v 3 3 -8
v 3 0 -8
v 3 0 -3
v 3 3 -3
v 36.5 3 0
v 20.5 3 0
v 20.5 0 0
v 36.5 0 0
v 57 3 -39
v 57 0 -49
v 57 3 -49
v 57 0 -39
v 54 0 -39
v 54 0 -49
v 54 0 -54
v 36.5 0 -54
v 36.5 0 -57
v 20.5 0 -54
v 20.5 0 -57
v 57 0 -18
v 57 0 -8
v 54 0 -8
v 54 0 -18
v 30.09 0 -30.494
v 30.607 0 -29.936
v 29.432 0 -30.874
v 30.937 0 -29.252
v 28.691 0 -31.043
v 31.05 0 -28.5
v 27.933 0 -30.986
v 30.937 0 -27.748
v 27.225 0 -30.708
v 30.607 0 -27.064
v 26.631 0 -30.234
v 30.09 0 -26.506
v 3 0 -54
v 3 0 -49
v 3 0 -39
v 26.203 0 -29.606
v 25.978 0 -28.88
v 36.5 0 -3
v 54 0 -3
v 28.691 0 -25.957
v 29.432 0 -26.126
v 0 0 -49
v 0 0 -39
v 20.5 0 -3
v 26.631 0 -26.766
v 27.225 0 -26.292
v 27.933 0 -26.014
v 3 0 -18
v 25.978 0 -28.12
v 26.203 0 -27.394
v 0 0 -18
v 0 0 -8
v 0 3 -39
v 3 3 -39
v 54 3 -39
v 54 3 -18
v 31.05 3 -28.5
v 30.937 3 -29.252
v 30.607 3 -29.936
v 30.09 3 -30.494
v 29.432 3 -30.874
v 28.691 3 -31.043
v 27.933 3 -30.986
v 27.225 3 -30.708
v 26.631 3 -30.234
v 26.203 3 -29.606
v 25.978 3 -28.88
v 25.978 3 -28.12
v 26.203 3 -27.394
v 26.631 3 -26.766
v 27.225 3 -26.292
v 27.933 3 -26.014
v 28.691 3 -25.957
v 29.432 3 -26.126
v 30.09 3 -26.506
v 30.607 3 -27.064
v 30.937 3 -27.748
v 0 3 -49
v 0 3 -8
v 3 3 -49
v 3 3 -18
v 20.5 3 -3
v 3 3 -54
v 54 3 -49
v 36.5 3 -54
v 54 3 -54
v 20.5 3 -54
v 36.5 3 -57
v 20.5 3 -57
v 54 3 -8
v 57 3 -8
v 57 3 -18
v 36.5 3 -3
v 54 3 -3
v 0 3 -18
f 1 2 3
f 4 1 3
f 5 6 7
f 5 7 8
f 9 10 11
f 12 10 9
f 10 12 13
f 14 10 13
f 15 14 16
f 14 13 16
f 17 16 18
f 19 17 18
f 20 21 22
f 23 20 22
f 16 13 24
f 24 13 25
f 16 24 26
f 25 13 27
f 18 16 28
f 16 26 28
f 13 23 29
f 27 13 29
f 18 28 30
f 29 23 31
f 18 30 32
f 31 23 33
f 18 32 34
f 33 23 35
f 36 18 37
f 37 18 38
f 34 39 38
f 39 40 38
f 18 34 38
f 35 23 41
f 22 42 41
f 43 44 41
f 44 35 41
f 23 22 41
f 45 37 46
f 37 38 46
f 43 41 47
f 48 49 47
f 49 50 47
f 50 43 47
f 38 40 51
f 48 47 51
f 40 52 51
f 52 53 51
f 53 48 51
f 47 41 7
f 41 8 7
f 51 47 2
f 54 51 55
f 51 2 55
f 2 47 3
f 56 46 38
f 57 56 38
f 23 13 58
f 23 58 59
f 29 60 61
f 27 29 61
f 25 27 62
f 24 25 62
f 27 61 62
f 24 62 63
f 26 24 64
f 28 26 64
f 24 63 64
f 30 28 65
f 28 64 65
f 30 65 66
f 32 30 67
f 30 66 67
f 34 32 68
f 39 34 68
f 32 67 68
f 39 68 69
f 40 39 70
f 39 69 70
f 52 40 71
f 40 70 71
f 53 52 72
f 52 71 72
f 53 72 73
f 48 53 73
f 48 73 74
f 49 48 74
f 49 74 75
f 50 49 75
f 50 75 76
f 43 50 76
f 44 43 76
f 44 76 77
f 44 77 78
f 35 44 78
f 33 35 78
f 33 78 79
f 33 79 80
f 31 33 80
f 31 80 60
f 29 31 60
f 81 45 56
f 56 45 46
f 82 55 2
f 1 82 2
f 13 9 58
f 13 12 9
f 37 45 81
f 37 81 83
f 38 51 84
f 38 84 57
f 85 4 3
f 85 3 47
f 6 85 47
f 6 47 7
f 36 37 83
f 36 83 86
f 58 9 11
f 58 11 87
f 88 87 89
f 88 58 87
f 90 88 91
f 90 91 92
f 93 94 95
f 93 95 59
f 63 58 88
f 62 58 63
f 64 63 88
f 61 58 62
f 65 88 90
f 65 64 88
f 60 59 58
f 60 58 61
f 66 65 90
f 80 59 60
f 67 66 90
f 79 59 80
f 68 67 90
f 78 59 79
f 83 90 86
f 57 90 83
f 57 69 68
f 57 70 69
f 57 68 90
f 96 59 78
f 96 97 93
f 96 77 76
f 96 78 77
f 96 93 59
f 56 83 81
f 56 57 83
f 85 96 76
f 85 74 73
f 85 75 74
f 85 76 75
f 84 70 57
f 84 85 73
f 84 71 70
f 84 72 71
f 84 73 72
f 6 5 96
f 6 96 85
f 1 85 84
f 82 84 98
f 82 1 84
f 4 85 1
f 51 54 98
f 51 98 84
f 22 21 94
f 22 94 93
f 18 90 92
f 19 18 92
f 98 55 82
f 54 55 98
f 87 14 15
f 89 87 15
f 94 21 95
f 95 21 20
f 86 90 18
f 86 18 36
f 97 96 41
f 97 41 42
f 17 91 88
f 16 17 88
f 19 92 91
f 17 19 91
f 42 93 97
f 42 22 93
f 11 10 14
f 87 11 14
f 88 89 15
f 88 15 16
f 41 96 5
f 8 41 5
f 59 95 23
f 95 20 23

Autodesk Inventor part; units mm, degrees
ref_plane "YZ Plane" through (0, 0, 0) normal (1, 0, 0) x (0, 1, 0)
ref_plane "XZ Plane" through (0, 0, 0) normal (0, 1, 0) x (-1, 0, 0)
ref_plane "XY Plane" through (0, 0, 0) normal (0, 0, 1) x (1, 0, 0)
sketch "Sketch1" plane through (0, 0, 0) normal (0, 1, 0) x (-1, 0, 0)
  line L0 (-28.5, -57) -> (-28.5, -28.5) construction
  line L1 (-28.5, -28.5) -> (-57, -28.5) construction
  line L2 (0, -49) -> (-3, -49)
  line L3 (-3, -49) -> (-3, -57)
  line L4 (0, -49) -> (0, -39)
  line L5 (0, -39) -> (-3, -39)
  line L6 (-3, -39) -> (-3, -28.5)
  line L7 (0, -8) -> (-3, -8)
  line L8 (-3, -8) -> (-3, 0)
  line L9 (0, -18) -> (-3, -18)
  line L10 (-3, -18) -> (-3, -28.5)
  line L11 (0, -8) -> (0, -18)
  line L12 (0, -39) -> (0, -49)
  line L13 (0, -49) -> (0, -39)
  line L14 (0, -18) -> (0, -8)
  line L15 (-57, -49) -> (-54, -49)
  line L16 (-54, -49) -> (-54, -57)
  line L17 (-57, -49) -> (-57, -39)
  line L18 (-57, -39) -> (-54, -39)
  line L19 (-54, -39) -> (-54, -28.5)
  line L20 (-57, -8) -> (-54, -8)
  line L21 (-54, -8) -> (-54, 0)
  line L22 (-57, -18) -> (-54, -18)
  line L23 (-54, -18) -> (-54, -28.5)
  line L24 (-57, -8) -> (-57, -18)
  line L25 (-57, -39) -> (-57, -49)
  line L26 (-57, -49) -> (-57, -39)
  line L27 (-57, -18) -> (-57, -8)
  line L28 (-57, -49) -> (-57, -39)
  line L29 (-57, -18) -> (-57, -8)
  line L30 (-28.5, -54) -> (-36.5, -54)
  line L31 (-36.5, -54) -> (-36.5, -57)
  line L32 (-28.5, -54) -> (-20.5, -54)
  line L33 (-20.5, -54) -> (-20.5, -57)
  line L34 (-3, -57) -> (-20.5, -57)
  line L35 (-36.5, -57) -> (-54, -57)
  line L36 (-28.5, -3) -> (-36.5, -3)
  line L37 (-36.5, -3) -> (-36.5, 0)
  line L38 (-20.5, -3) -> (-20.5, 0)
  line L39 (-28.5, -3) -> (-20.5, -3)
  line L40 (-54, 0) -> (-36.5, 0)
  line L41 (-20.5, 0) -> (-3, 0)
  point P0 (0, 0)
  point P1 (0, -57)
  dimension "d3" = 3
  dimension "d4" = 10
  dimension "d5" = 3
  dimension "d6" = 3
  dimension "d7" = 8
extrude "Extrusion1" add sketch "Sketch1" along normal blind 3
sketch "Sketch2" plane through (0, 3, 0) normal (0, 1, 0) x (1, 0, 0)
  line L0 (36.5, 0) -> (54, 0) projected
  line L1 (36.5, 3) -> (36.5, 0) projected
  line L2 (36.5, 0) -> (36.5, 3)
  line L3 (36.5, 3) -> (54, 3)
  line L4 (54, 0) -> (54, 8) projected
  line L5 (20.5, 0) -> (20.5, 3) projected
  line L6 (20.5, 0) -> (20.5, 3)
  line L7 (20.5, 3) -> (36.5, 3) projected
  line L8 (20.5, 3) -> (36.5, 3)
  line L9 (36.5, 3) -> (36.5, 0)
  line L10 (3, 0) -> (20.5, 0) projected
  line L11 (20.5, 0) -> (20.5, 3)
  line L12 (3, 0) -> (3, 3)
  line L13 (3, 8) -> (3, 0) projected
  line L14 (20.5, 3) -> (3, 3)
  point P0 (0, 0)
extrude "Extrusion2" cut sketch "Sketch2" against normal up to surface (3 mm away)
sketch "Sketch3" plane through (0, 3, 0) normal (0, 1, 0) x (1, 0, 0)
  line L0 (3, 3) -> (20.5, 3)
  line L1 (3, 3) -> (54, 3) projected
  line L2 (20.5, 3) -> (20.5, 0)
  line L3 (36.5, 54) -> (20.5, 54) projected
  line L4 (28.5, 54) -> (28.5, 14.4088) construction
  line L5 (54, 3) -> (36.5, 3)
  line L6 (36.5, 3) -> (36.5, 0)
  line L7 (20.5, 0) -> (36.5, 0)
  point P0 (0, 0)
  dimension "d12" = 17.5
extrude "Extrusion3" add sketch "Sketch3" against normal up to surface (3 mm away)
sketch "Sketch4" plane through (0, 3, 0) normal (0, 1, 0) x (1, 0, 0)
  line L0 (36.5, 54) -> (20.5, 54) projected
  line L1 (20.5, 54) -> (3, 54)
  line L2 (3, 57) -> (3, 49) projected
  line L3 (36.5, 57) -> (36.5, 54) projected
  line L4 (36.5, 54) -> (54, 54)
  line L5 (54, 49) -> (54, 57) projected
  line L6 (20.5, 57) -> (3, 57) projected
  line L7 (3, 54) -> (3, 57)
  line L8 (3, 57) -> (20.5, 57)
  line L9 (20.5, 57) -> (20.5, 54)
  line L10 (36.5, 57) -> (36.5, 54)
  line L11 (54, 57) -> (36.5, 57) projected
  line L12 (36.5, 57) -> (54, 57)
  line L13 (54, 57) -> (54, 54)
  point P0 (0, 0)
extrude "Extrusion4" cut sketch "Sketch4" against normal up to surface (3 mm away)
sketch "Sketch5" plane through (0, 3, 0) normal (0, 1, 0) x (1, 0, 0)
  line L0 (54, 18) -> (54, 39) projected
  line L1 (54, 28.5) -> (3, 28.5) construction
  line L2 (3, 39) -> (3, 18) projected
  line L3 (3, 3) -> (20.5, 3) projected
  line L4 (3, 3) -> (20.5, 3)
  line L5 (20.5, 3) -> (20.5, 0)
  line L6 (20.5, 0) -> (36.5, 0) projected
  line L7 (20.5, 0) -> (36.5, 0)
  line L8 (36.5, 0) -> (36.5, 3)
  line L9 (36.5, 3) -> (54, 3) projected
  line L10 (36.5, 3) -> (54, 3)
  line L11 (3, 54) -> (20.5, 54)
  line L12 (20.5, 54) -> (20.5, 57)
  line L13 (20.5, 57) -> (36.5, 57)
  line L14 (36.5, 57) -> (36.5, 54)
  line L15 (36.5, 54) -> (54, 54)
  line L16 (20.5, 54) -> (36.5, 54)
  line L17 (54, 54) -> (3, 54) projected
  point P0 (0, 0)
extrude "Extrusion5" add sketch "Sketch5" against normal up to surface (3 mm away)
sketch "Sketch6" plane through (0, 3, 0) normal (0, 1, 0) x (1, 0, 0)
  line L0 (3, 39) -> (3, 18) projected
  line L1 (3, 28.5) -> (54, 28.5) construction
  line L2 (54, 18) -> (54, 39) projected
  circle A0 centre (28.5, 28.5) radius 2.55
  line L3 (18.9611, 22.4556) -> (18.9611, 35.5833) construction
  line L4 (18.9611, 35.5833) -> (23.3056, 35.5833) construction
  line L5 (23.3056, 35.5833) -> (23.3056, 22.4556) construction
  line L6 (23.3056, 22.4556) -> (18.9611, 22.4556) construction
  point P0 (0, 0)
  dimension "d19" = 5.1
extrude "Extrusion6" cut sketch "Sketch6" against normal up to surface (3 mm away)
properties part number "Superior"
